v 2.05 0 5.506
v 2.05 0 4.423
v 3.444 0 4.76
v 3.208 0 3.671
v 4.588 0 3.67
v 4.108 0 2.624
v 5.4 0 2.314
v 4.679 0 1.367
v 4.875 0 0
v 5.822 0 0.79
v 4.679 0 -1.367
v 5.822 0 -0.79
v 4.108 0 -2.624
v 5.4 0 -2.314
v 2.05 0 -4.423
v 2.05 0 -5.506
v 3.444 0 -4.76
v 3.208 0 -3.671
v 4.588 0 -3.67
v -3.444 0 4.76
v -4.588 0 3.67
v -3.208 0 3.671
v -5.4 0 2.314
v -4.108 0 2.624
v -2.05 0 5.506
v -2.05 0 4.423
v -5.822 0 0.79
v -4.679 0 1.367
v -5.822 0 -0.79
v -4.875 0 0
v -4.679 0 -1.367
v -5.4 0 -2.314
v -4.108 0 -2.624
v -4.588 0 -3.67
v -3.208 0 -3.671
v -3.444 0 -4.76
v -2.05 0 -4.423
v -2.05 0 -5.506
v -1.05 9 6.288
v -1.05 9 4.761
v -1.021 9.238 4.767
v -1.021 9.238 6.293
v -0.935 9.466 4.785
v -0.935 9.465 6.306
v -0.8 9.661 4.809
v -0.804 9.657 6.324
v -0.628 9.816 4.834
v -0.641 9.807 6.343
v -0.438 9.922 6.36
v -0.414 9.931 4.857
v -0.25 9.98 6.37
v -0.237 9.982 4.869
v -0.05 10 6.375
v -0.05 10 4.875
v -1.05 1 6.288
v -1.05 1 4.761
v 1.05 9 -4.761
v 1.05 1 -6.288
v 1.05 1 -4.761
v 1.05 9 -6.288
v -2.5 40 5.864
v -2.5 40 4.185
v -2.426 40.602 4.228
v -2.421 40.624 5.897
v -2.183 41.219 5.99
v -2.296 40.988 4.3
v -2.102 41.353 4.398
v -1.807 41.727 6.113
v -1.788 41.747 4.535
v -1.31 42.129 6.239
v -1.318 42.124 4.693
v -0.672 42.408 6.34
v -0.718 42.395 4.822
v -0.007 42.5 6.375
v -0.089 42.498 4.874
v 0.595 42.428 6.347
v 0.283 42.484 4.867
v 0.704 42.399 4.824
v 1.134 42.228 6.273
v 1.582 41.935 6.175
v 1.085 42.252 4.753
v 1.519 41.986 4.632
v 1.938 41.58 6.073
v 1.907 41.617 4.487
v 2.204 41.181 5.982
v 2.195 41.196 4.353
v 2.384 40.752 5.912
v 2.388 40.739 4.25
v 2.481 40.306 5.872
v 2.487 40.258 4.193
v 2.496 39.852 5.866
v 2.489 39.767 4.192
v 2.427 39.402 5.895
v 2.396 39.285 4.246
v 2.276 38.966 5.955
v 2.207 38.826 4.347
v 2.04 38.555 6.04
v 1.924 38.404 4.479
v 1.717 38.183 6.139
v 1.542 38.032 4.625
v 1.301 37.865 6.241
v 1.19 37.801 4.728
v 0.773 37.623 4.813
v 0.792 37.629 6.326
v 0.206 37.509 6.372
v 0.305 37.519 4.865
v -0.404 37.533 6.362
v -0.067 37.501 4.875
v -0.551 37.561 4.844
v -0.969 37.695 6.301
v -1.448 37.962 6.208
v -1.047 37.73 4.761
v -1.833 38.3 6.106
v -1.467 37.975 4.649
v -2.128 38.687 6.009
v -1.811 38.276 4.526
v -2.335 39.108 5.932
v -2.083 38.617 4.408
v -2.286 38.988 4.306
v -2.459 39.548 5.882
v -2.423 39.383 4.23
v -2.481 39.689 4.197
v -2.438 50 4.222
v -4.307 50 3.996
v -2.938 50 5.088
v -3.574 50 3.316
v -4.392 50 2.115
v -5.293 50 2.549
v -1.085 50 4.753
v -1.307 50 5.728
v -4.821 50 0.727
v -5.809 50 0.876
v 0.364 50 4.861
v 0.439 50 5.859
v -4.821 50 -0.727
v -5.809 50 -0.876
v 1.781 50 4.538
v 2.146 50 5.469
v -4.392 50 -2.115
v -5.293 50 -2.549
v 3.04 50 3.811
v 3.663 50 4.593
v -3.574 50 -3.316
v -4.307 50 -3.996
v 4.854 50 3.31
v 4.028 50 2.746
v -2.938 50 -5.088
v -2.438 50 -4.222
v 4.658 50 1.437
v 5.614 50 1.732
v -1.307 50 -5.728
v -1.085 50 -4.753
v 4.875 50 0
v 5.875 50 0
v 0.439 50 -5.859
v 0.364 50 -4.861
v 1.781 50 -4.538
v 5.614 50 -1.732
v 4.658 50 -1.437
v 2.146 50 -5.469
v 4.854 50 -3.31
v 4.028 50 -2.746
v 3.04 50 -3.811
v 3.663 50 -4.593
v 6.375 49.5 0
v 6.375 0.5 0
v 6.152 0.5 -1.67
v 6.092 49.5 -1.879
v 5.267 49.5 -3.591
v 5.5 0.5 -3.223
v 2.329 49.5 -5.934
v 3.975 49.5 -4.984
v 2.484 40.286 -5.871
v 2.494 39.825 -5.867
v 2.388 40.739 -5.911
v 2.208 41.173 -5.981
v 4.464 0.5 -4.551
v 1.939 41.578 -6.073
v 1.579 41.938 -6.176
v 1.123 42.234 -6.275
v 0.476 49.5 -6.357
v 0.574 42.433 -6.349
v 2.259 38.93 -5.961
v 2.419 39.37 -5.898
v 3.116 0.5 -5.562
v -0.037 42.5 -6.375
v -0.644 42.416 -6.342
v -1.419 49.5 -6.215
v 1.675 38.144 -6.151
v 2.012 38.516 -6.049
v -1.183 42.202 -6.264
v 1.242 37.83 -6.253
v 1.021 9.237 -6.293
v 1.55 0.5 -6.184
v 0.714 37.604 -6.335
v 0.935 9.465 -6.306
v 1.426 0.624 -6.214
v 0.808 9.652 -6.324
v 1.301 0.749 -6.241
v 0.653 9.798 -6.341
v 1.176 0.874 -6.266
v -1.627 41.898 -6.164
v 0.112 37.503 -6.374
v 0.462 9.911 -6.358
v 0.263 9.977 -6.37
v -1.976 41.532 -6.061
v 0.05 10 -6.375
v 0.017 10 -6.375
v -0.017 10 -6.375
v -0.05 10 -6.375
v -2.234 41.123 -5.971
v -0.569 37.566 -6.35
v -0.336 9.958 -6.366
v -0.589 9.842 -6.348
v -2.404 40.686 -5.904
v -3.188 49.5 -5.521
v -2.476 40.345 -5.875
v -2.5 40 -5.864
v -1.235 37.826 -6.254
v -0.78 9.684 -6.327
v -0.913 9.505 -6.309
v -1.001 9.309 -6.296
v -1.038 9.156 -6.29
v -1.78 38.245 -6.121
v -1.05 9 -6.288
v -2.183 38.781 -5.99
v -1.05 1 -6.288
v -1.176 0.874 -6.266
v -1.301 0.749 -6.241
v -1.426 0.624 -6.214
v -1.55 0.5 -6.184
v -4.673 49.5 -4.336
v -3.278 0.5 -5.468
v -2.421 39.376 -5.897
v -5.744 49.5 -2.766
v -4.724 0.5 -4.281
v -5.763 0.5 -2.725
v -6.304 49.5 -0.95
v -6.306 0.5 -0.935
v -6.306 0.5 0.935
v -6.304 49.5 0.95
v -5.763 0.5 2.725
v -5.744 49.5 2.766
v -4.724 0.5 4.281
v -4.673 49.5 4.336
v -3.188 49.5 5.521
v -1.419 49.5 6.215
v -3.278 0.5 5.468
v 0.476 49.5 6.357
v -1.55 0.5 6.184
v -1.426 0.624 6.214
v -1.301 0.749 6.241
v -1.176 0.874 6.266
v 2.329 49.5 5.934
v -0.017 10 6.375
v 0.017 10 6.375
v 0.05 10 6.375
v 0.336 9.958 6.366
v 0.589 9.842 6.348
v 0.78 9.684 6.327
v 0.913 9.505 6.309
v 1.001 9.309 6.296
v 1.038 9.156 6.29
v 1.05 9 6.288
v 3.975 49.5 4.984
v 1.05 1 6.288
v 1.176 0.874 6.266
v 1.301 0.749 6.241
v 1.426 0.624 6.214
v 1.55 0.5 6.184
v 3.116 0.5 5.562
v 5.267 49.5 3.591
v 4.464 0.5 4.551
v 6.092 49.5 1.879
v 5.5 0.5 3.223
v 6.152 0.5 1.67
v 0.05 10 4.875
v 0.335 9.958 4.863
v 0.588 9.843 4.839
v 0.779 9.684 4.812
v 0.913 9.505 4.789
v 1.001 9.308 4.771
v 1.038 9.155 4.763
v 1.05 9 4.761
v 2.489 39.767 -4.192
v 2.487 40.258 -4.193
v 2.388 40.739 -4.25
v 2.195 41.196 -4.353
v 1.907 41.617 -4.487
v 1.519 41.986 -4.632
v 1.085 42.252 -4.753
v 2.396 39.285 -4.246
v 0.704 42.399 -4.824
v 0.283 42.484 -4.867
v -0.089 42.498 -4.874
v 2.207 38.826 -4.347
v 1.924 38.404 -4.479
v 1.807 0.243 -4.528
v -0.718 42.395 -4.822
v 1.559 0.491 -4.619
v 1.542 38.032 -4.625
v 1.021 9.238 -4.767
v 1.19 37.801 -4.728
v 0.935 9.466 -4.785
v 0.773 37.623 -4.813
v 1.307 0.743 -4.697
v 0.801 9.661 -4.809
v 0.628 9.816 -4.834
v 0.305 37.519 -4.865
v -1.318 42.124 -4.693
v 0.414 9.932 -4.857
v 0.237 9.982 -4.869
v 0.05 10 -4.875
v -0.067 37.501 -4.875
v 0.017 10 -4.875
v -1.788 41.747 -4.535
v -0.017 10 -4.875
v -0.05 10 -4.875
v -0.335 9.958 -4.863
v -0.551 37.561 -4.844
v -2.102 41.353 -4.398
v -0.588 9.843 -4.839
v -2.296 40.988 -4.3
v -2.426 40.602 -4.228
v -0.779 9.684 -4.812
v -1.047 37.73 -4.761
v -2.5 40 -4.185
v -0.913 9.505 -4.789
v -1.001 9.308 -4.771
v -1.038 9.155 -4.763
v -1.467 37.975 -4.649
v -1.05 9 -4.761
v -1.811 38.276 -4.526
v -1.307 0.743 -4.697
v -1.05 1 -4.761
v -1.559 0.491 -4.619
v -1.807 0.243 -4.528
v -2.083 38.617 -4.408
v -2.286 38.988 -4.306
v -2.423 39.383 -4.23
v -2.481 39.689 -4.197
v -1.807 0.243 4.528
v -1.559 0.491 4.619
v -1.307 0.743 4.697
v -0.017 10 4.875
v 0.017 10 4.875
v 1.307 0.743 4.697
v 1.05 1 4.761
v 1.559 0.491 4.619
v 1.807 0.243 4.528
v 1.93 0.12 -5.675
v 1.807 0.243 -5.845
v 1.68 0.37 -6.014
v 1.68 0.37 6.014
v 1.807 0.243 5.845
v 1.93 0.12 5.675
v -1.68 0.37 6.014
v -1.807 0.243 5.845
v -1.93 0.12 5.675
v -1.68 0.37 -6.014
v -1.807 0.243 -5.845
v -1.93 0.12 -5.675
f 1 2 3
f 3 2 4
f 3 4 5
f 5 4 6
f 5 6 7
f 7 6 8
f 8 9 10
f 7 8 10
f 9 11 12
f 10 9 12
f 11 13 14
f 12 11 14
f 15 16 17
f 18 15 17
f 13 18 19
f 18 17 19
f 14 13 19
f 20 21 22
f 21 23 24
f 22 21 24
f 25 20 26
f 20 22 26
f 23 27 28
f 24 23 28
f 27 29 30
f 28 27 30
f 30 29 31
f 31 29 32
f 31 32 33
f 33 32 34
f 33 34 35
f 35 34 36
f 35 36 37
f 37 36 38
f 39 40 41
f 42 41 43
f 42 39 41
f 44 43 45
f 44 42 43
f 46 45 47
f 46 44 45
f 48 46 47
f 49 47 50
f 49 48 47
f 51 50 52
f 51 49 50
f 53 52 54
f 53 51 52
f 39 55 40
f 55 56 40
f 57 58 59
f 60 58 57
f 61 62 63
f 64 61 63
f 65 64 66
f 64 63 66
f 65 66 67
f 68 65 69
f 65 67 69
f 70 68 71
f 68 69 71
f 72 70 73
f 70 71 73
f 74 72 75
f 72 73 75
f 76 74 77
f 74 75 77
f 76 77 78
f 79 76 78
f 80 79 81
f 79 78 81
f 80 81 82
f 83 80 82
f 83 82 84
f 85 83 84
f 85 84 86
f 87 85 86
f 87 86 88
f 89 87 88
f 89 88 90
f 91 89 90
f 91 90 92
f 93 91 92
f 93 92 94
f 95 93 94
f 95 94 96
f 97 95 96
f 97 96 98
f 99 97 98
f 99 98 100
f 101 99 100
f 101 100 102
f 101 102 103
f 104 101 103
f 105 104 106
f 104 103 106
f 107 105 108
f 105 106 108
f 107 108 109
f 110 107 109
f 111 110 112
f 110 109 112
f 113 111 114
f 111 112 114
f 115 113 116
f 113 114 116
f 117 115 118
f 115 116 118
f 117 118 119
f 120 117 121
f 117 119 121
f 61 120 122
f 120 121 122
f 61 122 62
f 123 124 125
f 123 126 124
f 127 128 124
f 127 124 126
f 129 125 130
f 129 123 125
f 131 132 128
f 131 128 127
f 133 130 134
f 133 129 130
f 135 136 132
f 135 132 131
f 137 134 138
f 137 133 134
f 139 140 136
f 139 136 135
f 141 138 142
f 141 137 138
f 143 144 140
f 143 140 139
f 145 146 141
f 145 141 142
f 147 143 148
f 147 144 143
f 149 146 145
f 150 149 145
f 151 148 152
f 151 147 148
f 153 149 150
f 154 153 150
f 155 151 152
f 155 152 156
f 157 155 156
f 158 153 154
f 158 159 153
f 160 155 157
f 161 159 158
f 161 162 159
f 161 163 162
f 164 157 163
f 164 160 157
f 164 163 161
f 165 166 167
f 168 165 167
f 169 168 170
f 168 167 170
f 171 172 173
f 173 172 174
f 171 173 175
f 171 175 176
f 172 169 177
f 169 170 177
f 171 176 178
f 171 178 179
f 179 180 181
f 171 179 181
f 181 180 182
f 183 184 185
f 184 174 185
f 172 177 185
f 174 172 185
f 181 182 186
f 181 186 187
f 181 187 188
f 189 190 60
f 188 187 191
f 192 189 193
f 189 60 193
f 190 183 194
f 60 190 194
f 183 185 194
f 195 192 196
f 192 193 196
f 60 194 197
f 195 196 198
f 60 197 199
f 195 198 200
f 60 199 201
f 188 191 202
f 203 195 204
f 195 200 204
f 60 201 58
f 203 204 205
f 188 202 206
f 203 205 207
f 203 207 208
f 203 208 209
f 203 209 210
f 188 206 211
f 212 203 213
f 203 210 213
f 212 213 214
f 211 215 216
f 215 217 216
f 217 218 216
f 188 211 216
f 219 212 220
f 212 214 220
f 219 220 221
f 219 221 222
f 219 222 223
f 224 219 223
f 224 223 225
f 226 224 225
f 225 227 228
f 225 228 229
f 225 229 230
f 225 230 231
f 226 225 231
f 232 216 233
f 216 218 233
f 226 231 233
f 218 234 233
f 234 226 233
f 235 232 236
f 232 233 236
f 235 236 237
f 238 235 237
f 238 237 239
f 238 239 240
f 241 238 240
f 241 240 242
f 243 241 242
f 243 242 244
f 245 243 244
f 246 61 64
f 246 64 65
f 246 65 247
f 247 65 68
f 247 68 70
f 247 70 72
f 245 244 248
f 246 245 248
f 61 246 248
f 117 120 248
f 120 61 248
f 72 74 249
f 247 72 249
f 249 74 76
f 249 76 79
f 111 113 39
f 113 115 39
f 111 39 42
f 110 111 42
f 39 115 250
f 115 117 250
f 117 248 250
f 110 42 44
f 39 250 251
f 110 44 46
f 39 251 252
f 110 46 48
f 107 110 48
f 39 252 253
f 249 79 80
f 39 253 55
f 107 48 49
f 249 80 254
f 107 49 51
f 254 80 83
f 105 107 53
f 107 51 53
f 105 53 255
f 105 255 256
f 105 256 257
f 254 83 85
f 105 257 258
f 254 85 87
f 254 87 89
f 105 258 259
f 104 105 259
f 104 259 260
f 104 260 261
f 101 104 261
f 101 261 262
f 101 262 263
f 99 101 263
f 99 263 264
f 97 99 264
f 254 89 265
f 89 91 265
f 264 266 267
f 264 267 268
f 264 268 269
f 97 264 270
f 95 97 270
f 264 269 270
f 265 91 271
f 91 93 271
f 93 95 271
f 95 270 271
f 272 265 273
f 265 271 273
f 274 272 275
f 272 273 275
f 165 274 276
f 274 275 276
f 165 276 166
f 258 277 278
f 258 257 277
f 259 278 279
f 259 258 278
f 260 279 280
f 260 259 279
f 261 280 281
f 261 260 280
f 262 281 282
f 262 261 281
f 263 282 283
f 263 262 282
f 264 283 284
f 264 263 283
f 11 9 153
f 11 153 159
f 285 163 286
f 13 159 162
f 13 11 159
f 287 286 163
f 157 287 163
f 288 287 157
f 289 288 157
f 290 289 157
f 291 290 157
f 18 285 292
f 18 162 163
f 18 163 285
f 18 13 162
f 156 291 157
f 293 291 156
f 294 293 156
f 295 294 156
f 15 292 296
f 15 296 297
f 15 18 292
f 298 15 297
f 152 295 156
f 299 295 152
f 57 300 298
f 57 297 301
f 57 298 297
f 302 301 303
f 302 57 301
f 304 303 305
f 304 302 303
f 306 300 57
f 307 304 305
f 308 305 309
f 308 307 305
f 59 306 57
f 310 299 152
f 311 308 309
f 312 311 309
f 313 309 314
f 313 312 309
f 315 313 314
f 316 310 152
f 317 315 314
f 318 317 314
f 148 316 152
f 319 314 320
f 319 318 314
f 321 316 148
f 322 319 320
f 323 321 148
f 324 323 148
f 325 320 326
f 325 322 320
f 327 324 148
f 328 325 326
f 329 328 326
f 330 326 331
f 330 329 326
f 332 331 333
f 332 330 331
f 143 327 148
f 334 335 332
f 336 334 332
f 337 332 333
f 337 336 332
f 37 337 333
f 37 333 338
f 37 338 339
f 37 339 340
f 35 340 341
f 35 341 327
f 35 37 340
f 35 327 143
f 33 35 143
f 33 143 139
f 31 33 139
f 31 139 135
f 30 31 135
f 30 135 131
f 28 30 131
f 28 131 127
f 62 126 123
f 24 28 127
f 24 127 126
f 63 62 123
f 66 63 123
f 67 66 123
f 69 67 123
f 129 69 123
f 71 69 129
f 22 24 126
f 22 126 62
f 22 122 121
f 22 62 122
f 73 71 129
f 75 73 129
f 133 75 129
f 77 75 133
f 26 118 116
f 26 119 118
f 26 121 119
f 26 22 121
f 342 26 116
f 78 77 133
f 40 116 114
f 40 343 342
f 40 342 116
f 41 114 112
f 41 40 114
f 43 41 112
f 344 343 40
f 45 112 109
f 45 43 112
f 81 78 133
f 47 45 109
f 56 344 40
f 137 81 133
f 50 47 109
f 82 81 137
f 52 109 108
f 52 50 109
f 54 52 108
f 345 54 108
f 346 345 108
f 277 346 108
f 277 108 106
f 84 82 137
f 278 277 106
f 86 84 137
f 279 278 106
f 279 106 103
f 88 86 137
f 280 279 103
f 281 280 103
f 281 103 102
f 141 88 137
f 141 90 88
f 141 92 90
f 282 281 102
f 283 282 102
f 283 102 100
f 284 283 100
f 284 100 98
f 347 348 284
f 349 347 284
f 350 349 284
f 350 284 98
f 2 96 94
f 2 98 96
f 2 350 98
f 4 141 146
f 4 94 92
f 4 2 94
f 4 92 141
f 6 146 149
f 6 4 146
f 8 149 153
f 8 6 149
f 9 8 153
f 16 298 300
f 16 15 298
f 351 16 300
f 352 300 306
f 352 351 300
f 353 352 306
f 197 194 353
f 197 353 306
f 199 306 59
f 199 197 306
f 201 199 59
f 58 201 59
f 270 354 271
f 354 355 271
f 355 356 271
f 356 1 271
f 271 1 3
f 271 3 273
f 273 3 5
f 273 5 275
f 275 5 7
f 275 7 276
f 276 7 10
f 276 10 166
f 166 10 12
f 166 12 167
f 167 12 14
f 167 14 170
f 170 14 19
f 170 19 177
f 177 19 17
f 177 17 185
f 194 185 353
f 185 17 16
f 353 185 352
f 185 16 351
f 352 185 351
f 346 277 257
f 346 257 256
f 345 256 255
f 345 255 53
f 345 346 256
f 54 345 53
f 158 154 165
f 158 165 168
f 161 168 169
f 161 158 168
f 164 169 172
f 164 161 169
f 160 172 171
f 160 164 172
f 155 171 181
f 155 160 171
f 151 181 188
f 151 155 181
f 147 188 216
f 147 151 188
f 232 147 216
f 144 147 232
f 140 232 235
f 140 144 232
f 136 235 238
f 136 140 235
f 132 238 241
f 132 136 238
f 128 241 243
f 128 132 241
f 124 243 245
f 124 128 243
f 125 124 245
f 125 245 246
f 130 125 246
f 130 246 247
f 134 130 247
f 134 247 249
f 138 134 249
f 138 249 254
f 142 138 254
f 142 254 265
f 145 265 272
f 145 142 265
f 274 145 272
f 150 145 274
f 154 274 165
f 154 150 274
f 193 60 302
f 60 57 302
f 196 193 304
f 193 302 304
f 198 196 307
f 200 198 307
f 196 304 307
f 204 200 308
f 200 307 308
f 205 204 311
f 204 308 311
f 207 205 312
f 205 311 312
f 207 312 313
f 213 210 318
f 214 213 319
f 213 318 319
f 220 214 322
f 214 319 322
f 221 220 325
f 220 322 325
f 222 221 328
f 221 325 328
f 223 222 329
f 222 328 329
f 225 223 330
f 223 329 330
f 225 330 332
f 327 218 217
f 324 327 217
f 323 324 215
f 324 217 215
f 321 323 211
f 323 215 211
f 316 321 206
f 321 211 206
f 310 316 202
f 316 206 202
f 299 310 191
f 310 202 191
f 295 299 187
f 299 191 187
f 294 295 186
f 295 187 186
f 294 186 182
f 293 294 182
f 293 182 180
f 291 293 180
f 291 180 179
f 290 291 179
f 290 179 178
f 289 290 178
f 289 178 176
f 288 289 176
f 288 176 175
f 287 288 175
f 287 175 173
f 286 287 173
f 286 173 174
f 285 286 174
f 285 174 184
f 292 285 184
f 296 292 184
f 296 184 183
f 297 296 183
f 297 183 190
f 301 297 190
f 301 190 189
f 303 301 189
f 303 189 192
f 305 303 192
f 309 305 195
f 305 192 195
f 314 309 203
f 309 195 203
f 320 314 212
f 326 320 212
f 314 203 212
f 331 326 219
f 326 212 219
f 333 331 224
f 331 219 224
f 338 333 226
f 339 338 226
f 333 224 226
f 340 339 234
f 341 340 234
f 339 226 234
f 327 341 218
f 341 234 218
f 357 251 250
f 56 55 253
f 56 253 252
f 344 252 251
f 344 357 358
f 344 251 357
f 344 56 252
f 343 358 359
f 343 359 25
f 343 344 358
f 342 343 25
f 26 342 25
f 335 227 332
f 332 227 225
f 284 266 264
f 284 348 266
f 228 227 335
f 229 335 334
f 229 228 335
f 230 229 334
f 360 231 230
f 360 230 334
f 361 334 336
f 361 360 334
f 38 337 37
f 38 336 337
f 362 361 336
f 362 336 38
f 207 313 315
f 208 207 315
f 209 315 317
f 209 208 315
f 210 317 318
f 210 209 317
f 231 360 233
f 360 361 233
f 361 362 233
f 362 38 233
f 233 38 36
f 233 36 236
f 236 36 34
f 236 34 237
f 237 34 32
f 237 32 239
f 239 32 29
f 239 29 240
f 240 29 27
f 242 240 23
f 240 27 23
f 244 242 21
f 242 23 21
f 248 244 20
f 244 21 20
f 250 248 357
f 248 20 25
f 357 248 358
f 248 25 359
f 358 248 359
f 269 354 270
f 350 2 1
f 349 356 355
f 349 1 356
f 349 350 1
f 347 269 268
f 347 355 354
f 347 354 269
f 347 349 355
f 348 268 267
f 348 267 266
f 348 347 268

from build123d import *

# Parameters (mm, degrees)
SKETCH1_R           = 6.375
SKETCH1_R_2         = 4.875
BOSS_EXTRUDE1_DEPTH = 50
SKETCH2_W           = 2.1
SKETCH2_H           = 10
CUT_EXTRUDE1_DEPTH  = 52.992337176
CUT_EXTRUDE2_DEPTH  = 52.992337176
FILLET1_R           = 1
CHAMFER1_SIZE       = 0.5
SKETCH4_R           = 2.5
CUT_EXTRUDE3_DEPTH  = 52.992337309


with BuildPart() as part:
    # Sketch1 → Boss-Extrude1 (new body)
    with BuildSketch(Plane(origin=(0, 0, 0), x_dir=(1, 0, 0), z_dir=(0, 1, 0))):
        Circle(SKETCH1_R)
        Circle(SKETCH1_R_2, mode=Mode.SUBTRACT)
    extrude(amount=BOSS_EXTRUDE1_DEPTH)

    # Sketch2 → Cut-Extrude1 (cut, through all)
    with BuildSketch(Plane(origin=(0, 0, -6.375), x_dir=(-1, 0, 0), z_dir=(0, 0, -1))):
        with Locations((0, 5)):
            Rectangle(SKETCH2_W, SKETCH2_H)
    extrude(amount=-CUT_EXTRUDE1_DEPTH, mode=Mode.SUBTRACT)

    # Sketch3 → Cut-Extrude2 (cut, through all)
    with BuildSketch(Plane(origin=(0, 0, -6.375), x_dir=(-1, 0, 0), z_dir=(0, 0, -1))):
        Polygon((2.05, 0), (-2.05, 0), (0, 2.05), align=None)
    extrude(amount=-CUT_EXTRUDE2_DEPTH, mode=Mode.SUBTRACT)

    # Fillet1
    fillet1_edges = [part.edges().sort_by_distance(p)[0] for p in [
        (1.05, 10, 5.524257599),
        (-1.05, 10, 5.524257599),
        (1.05, 10, -5.524257599),
        (-1.05, 10, -5.524257599),
    ]]
    fillet(fillet1_edges, radius=FILLET1_R)

    # Chamfer1
    chamfer1_edges = [part.edges().sort_by_distance(p)[0] for p in [
        (5.182150857, 0, 3.712941893),
        (-6.375, 0, 0),
        (-6.375, 50, 0),
    ]]
    chamfer(chamfer1_edges, length=CHAMFER1_SIZE)

    # Sketch4 → Cut-Extrude3 (cut, through all)
    with BuildSketch(Plane(origin=(0, 0, -6.375), x_dir=(-1, 0, 0), z_dir=(0, 0, -1))):
        with Locations((0, 40)):
            Circle(SKETCH4_R)
    extrude(amount=-CUT_EXTRUDE3_DEPTH, mode=Mode.SUBTRACT)


solid = part.part
